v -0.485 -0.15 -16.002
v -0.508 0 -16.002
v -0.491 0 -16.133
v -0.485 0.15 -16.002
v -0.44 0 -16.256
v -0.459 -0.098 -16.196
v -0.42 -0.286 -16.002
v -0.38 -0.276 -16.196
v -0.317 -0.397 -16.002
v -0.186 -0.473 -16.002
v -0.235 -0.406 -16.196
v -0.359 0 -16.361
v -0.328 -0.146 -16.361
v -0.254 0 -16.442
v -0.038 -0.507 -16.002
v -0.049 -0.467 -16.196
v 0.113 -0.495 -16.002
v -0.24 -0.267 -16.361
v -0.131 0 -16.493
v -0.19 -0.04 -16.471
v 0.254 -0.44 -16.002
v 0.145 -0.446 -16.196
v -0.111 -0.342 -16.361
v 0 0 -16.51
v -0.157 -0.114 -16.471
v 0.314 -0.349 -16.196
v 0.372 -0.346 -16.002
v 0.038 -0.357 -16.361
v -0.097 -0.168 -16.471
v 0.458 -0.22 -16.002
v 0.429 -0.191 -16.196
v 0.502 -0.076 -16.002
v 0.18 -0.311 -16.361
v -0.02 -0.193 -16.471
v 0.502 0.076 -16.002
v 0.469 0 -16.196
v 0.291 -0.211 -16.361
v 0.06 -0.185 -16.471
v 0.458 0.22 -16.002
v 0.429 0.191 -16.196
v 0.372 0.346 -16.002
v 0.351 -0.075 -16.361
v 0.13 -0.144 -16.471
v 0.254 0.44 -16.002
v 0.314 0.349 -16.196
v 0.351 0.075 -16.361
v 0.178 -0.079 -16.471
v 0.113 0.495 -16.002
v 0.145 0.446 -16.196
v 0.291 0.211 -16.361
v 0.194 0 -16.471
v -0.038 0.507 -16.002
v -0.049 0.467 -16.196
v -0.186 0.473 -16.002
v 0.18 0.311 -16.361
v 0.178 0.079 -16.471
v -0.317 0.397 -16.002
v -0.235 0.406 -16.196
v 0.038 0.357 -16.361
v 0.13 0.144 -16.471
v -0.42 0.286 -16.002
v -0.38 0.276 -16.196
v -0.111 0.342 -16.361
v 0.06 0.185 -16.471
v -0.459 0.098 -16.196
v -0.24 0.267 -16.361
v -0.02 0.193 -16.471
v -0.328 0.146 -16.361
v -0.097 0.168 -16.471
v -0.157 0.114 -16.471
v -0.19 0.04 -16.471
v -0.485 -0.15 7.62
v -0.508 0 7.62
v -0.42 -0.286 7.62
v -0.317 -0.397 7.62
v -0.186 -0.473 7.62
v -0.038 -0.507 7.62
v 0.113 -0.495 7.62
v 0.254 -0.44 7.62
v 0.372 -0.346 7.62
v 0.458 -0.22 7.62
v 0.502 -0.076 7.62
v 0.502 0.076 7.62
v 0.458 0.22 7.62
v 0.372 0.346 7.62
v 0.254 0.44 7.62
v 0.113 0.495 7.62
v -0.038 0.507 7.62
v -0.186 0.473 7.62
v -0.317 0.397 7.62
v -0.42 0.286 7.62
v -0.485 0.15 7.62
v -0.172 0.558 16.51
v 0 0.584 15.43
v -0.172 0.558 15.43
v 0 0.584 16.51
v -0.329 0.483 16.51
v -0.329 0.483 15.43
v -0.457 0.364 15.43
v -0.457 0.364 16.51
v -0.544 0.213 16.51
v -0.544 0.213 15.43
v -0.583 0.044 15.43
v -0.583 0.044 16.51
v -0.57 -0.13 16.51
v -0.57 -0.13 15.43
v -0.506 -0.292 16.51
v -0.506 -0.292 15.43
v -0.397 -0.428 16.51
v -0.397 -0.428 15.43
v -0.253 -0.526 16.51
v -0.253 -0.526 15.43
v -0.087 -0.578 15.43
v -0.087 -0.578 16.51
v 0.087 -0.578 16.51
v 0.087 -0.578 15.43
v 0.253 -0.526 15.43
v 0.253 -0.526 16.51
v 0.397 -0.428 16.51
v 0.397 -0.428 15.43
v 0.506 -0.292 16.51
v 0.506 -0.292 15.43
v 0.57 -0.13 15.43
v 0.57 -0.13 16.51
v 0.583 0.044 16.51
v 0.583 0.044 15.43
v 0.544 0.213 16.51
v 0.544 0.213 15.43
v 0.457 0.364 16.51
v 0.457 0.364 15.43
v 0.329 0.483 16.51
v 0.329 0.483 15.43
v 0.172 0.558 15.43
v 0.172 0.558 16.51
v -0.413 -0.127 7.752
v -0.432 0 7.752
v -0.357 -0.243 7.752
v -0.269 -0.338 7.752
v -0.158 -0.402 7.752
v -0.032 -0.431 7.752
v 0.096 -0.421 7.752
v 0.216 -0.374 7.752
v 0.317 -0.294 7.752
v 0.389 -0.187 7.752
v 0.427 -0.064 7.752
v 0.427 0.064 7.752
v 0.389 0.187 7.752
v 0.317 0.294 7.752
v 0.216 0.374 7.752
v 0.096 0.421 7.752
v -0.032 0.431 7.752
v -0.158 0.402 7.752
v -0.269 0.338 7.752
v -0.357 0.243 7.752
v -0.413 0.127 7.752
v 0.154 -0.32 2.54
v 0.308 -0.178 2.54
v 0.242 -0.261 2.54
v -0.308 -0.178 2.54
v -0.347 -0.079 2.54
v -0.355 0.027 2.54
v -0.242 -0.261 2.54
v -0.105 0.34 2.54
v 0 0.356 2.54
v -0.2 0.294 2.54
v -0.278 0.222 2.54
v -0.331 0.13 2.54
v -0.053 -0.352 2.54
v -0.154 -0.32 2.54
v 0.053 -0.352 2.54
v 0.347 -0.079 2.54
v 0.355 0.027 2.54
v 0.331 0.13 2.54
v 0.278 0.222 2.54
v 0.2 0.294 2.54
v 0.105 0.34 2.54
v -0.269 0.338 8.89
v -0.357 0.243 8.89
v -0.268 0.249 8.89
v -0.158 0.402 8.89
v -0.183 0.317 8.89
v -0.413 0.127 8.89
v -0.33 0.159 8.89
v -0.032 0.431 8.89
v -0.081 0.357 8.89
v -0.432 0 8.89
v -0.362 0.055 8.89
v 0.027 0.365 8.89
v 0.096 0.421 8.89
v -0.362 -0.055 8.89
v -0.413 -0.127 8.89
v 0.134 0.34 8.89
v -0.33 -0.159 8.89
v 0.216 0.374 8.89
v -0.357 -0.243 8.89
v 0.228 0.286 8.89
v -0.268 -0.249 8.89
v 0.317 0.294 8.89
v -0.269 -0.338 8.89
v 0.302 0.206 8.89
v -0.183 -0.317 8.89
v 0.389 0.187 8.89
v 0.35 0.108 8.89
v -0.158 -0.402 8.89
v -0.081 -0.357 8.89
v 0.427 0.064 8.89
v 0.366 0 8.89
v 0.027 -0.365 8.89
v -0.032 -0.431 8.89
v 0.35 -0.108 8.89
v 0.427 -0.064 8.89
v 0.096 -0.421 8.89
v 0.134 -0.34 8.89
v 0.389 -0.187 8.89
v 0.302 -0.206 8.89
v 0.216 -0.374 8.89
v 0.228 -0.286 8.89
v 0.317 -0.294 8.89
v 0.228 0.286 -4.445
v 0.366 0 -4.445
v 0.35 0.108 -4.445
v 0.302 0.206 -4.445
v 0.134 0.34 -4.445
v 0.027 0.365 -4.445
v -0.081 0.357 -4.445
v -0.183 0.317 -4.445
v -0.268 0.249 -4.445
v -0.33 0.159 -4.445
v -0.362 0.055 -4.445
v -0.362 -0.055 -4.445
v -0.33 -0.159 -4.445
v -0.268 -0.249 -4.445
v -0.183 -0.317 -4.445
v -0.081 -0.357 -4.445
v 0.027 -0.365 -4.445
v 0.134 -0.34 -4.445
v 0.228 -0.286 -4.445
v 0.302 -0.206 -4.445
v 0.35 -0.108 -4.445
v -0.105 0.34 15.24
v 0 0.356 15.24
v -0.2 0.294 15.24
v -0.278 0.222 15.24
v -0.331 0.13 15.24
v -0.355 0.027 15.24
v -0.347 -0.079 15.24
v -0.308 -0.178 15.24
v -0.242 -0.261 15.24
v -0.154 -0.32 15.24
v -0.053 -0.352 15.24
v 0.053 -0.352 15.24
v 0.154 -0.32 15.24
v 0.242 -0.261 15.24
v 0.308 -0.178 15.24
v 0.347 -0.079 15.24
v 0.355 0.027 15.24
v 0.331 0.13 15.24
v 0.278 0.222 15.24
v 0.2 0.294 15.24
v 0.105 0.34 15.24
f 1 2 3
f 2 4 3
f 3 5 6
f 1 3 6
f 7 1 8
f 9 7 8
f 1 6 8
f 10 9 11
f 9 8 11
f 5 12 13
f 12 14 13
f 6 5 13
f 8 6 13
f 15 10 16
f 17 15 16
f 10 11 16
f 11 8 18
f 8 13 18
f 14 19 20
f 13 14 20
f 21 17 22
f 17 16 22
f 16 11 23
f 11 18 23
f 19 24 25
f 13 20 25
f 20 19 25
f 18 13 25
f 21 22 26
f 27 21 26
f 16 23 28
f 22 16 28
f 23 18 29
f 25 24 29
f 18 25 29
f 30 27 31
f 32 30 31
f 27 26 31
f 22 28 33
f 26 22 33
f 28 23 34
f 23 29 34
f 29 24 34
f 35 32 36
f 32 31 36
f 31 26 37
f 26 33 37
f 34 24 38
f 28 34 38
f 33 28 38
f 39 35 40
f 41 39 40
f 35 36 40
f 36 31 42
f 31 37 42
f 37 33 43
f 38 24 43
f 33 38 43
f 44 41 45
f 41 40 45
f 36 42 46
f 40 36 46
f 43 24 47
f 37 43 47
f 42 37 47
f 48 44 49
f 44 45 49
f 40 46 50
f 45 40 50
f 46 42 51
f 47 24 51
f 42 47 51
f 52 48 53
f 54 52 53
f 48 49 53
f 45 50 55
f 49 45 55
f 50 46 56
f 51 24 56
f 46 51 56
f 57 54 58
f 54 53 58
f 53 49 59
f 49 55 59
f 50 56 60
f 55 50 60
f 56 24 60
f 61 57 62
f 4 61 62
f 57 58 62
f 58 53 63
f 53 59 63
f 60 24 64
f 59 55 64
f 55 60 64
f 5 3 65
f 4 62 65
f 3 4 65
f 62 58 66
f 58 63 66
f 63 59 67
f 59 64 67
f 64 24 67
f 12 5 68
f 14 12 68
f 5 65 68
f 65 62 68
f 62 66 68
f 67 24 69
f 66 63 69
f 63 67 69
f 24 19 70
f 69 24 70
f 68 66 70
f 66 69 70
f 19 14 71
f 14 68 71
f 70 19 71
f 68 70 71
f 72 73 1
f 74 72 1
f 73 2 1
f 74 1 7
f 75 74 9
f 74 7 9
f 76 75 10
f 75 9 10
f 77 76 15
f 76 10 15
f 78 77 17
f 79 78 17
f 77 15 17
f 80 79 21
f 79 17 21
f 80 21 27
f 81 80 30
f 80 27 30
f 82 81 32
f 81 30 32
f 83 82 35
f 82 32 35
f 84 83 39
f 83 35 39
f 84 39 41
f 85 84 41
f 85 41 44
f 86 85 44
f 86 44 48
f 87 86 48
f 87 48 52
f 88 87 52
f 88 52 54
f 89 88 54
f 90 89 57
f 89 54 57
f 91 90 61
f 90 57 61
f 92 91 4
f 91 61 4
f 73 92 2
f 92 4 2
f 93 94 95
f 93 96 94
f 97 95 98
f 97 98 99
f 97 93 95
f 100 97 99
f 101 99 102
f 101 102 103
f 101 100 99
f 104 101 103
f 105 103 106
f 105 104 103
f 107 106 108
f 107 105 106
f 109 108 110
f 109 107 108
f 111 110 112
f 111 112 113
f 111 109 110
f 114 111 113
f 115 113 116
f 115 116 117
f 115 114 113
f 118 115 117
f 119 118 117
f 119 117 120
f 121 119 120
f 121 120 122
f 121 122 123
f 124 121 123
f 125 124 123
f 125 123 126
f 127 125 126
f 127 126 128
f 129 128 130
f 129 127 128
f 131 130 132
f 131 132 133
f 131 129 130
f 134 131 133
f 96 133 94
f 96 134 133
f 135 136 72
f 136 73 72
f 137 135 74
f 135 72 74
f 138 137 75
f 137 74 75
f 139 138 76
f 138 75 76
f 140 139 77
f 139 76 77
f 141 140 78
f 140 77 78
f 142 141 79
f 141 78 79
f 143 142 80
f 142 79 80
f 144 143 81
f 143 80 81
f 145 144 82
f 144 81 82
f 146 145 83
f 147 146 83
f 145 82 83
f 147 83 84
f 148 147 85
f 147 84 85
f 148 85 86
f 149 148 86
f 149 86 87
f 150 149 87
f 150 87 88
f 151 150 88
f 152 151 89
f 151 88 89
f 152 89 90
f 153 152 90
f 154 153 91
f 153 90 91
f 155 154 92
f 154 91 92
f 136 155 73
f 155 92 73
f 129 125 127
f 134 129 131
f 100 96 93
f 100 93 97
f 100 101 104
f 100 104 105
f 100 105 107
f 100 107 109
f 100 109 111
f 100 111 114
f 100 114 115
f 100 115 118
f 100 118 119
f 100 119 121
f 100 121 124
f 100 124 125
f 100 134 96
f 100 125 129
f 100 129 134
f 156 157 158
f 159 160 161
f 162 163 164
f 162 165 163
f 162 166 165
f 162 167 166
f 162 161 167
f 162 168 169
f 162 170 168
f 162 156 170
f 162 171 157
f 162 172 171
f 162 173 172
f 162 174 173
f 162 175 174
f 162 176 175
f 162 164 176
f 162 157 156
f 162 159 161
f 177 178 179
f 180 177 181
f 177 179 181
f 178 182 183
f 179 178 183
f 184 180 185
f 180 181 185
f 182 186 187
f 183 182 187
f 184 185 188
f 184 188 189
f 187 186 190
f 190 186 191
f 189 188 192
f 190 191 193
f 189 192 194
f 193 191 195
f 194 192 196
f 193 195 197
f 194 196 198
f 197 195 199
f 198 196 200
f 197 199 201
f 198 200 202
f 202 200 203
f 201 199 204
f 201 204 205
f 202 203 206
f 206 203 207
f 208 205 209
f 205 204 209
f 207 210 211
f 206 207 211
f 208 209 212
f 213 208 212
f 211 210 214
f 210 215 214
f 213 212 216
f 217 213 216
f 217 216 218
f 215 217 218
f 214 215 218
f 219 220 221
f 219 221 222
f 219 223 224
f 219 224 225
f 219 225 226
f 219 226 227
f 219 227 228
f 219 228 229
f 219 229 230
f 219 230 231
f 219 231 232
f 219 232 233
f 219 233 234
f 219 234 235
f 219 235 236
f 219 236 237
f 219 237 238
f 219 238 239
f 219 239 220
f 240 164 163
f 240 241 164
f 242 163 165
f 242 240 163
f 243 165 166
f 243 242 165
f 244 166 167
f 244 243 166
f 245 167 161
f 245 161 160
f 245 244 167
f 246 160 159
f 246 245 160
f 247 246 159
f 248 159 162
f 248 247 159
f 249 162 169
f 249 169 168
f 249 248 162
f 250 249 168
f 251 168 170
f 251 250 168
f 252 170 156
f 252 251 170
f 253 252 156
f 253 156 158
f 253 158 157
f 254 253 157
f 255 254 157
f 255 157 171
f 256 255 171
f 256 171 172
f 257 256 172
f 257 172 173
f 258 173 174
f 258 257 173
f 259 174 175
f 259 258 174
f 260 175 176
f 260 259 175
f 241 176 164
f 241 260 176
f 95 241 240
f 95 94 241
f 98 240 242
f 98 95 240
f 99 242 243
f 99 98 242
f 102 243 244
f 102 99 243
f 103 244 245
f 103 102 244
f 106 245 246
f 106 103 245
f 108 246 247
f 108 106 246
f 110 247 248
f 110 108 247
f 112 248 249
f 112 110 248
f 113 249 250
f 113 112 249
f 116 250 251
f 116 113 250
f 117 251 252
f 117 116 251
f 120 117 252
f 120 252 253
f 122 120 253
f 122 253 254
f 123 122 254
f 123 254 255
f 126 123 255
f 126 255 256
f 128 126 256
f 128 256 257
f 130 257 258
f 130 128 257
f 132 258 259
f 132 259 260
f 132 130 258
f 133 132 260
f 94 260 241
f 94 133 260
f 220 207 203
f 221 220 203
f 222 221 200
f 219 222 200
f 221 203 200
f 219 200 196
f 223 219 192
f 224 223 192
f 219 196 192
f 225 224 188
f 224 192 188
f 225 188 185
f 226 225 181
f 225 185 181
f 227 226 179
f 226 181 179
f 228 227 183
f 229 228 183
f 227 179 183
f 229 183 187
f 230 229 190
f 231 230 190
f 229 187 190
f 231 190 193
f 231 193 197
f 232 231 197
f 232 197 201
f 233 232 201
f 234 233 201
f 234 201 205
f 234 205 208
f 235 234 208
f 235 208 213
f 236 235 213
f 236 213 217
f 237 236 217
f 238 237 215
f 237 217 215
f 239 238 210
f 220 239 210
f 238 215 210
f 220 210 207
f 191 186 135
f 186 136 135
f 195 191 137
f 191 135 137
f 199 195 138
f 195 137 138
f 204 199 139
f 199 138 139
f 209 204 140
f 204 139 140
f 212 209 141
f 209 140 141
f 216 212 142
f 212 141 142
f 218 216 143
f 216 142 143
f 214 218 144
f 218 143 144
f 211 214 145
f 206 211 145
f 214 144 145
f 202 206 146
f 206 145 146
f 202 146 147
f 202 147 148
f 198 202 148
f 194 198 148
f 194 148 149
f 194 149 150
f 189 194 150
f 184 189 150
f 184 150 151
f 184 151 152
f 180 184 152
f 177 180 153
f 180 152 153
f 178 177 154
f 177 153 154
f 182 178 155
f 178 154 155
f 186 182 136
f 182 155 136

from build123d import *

# Parameters (mm, degrees)
SKETCH4_R          = 0.36576
CUT_EXTRUDE1_DEPTH = 13.335


with BuildPart() as part:
    # Sketch2 → Revolve1 (revolve)
    with BuildSketch(Plane(origin=(0, 0, 0), x_dir=(0, 0, -1), z_dir=(1, 0, 0))):
        with BuildLine():
            Line((-7.62, 0.508), (16.002, 0.508))
            ThreePointArc((16.002, 0.508), (16.361210245, 0.359210245), (16.51, 0))
            Line((16.51, 0), (-8.89, 0))
            Line((-8.89, 0), (-8.89, 0.4318))
            Line((-8.89, 0.4318), (-7.751982272, 0.4318))
            Line((-7.751982272, 0.4318), (-7.62, 0.508))
        make_face()
    revolve(axis=Axis((0, 0, -16.51), (0, 0, 1)))

    # Sketch4 → Cut-Extrude1 (cut)
    with BuildSketch(Plane.XY.offset(8.89)):
        Circle(SKETCH4_R)
    extrude(amount=-CUT_EXTRUDE1_DEPTH, mode=Mode.SUBTRACT)


with BuildPart() as body_2:
    # Sketch3 → Revolve2 (revolve)
    with BuildSketch(Plane(origin=(0, 0, 0), x_dir=(0, 0, -1), z_dir=(1, 0, 0))):
        Polygon((-16.51, 0.5842), (-16.51, 0), (-2.54, 0), (-2.54, 0.3556), (-15.24, 0.3556), (-15.4305, 0.5842), align=None)
    revolve(axis=Axis((0, 0, 0), (0, 0, 1)))


solid = Compound([part.part, body_2.part])
